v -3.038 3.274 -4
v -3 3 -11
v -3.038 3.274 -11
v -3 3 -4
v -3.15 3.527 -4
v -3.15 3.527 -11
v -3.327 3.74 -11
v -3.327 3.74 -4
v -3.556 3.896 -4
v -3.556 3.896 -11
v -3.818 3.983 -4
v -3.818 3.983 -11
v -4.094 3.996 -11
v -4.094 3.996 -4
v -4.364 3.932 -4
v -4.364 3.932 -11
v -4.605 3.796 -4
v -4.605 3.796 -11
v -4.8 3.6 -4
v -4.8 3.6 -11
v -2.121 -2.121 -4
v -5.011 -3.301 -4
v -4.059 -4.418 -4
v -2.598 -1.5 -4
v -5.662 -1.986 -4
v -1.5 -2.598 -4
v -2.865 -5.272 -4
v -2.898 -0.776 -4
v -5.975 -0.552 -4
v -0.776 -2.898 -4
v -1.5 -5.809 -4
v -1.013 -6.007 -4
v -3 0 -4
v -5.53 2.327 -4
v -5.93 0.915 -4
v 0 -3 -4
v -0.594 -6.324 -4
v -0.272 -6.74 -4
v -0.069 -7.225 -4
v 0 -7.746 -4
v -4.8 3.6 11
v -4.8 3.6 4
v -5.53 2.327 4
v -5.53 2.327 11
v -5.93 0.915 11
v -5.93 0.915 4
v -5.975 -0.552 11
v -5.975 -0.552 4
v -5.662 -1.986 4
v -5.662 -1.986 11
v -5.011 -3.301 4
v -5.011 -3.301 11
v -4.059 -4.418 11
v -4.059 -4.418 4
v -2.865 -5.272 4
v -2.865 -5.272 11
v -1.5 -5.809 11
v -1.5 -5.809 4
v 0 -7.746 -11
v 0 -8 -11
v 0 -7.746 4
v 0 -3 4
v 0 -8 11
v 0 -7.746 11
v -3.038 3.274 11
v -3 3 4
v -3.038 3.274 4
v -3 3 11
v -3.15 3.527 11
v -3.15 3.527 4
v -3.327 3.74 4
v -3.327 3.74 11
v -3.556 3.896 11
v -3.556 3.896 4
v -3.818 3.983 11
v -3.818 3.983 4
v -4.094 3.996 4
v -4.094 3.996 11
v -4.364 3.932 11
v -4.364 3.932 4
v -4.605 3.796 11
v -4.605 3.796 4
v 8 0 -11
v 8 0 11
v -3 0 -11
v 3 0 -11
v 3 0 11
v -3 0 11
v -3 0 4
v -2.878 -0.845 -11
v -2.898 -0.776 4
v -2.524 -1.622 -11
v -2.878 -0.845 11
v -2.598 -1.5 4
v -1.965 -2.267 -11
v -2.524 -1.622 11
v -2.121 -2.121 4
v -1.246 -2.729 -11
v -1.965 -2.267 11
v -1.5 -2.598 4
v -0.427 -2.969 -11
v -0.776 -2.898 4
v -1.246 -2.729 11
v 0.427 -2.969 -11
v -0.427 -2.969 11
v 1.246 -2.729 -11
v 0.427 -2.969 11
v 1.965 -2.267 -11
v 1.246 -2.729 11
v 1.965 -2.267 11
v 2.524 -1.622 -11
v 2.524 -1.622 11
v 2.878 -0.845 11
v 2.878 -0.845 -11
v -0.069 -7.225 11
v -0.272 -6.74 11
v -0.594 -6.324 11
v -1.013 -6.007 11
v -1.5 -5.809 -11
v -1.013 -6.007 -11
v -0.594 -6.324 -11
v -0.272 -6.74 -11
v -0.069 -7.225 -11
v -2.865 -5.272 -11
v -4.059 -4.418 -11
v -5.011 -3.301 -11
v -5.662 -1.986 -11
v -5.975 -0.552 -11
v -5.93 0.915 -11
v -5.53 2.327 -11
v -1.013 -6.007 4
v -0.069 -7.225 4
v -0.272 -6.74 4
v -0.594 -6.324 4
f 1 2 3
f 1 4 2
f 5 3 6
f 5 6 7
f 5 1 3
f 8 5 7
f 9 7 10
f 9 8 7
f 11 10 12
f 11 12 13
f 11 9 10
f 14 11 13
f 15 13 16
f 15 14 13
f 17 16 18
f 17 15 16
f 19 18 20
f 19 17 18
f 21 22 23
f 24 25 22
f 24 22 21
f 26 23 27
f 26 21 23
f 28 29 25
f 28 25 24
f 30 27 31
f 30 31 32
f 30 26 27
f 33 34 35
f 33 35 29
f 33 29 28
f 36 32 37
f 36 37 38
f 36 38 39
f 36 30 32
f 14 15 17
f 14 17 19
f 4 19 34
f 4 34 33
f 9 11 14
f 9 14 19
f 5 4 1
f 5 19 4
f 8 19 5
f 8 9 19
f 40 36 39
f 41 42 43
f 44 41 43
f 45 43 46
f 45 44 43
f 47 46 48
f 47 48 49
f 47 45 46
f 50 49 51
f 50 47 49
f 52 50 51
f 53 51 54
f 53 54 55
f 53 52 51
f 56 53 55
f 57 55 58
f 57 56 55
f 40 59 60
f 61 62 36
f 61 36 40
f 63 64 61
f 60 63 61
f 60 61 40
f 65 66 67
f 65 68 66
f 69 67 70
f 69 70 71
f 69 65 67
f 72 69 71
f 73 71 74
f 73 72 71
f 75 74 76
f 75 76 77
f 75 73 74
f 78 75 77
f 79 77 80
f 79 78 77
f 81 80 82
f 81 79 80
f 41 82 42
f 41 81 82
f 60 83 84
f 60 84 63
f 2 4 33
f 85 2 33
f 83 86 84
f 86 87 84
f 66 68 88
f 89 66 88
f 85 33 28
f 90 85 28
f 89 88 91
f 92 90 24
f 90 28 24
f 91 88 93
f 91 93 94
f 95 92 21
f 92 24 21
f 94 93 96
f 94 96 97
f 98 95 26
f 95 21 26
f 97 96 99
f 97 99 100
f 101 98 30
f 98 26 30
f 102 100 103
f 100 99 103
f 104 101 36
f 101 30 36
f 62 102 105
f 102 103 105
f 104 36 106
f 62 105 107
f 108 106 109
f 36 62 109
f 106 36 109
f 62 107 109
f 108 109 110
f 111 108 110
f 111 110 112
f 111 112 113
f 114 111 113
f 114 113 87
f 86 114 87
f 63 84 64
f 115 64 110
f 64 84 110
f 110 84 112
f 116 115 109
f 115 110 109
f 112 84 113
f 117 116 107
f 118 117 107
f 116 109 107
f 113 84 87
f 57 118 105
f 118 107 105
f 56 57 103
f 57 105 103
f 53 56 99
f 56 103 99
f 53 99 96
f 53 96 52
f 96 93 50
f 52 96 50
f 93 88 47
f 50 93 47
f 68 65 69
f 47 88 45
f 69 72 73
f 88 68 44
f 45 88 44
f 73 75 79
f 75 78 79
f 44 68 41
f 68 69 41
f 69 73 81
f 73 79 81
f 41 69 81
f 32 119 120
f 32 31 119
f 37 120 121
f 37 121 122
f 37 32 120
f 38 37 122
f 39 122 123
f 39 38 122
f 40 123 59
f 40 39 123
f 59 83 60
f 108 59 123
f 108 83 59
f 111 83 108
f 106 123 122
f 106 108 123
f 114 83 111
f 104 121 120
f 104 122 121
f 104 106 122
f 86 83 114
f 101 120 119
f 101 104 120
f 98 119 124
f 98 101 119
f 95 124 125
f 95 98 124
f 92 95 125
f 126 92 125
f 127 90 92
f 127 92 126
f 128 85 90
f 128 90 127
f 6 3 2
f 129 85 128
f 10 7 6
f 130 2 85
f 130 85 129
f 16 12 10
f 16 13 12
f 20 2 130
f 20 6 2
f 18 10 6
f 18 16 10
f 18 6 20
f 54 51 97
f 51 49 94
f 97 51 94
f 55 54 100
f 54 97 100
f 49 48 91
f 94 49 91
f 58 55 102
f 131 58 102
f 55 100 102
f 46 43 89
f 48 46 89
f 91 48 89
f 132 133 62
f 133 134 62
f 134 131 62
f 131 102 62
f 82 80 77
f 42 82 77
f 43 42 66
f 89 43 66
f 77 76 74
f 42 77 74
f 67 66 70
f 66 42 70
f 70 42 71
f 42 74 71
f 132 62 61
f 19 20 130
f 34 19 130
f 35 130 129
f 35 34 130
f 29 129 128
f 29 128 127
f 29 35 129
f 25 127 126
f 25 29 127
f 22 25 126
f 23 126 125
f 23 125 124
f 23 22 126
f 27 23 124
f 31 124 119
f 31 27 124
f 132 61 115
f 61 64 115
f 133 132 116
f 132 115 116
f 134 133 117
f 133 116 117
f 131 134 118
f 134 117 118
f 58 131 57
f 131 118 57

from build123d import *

# Parameters (mm, degrees)
PAD_DEPTH    = 11
POCKET_DEPTH = 4
FILLET_R     = 1
FILLET001_R  = 2


with BuildPart() as part:
    # Sketch → Pad (new body, symmetric)
    with BuildSketch(Plane.XY):
        with BuildLine():
            ThreePointArc((-3, 0), (0, -3), (3, 0))
            Line((3, 0), (8, 0))
            Line((8, 0), (0, -8))
            Line((0, -8), (0, -6))
            ThreePointArc((-3, 5.196152), (-5.795555, -1.552914), (0, -6))
            Line((-3, 5.196152), (-3, 0))
        make_face()
    extrude(amount=PAD_DEPTH, both=True)

    # Sketch001 → Pocket (cut, symmetric)
    with BuildSketch(Plane.XY):
        with BuildLine():
            ThreePointArc((0.45045, 7.486461), (-7.496614, 0.225327), (0, -7.5))
            Line((0, -2.5), (0, -7.5))
            ThreePointArc((0.45045, 2.459084), (-2.48975, 0.226152), (0, -2.5))
            Line((0.45045, 2.459084), (0.45045, 7.486461))
        make_face()
    extrude(amount=POCKET_DEPTH, both=True, mode=Mode.SUBTRACT)

    # Fillet
    fillet_edges = [part.edges().sort_by_distance(p)[0] for p in [
        (-3, 5.196152, 7.5),
        (-3, 5.196152, -7.5),
    ]]
    fillet(fillet_edges, radius=FILLET_R)

    # Fillet001
    fillet001_edges = [part.edges().sort_by_distance(p)[0] for p in [
        (0, -6, -7.5),
        (0, -6, 7.5),
    ]]
    fillet(fillet001_edges, radius=FILLET001_R)


solid = part.part
